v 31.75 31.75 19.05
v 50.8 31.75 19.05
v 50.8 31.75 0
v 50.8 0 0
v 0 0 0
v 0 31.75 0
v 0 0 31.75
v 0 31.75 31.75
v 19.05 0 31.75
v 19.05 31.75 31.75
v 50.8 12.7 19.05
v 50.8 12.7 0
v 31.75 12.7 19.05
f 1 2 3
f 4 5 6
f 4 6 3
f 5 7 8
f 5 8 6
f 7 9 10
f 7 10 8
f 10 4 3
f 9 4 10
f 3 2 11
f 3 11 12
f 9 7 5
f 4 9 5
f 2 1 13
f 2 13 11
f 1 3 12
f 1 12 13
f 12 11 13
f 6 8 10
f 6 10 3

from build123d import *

# Parameters (mm, degrees)
F1_DEPTH = 31.75
F3_DEPTH = 19.05


with BuildPart() as f1:
    # F0 (on Front) → F1 (new body)
    with BuildSketch(Plane.XZ):
        Polygon((0, 31.75), (0, 0), (50.8, 0), (19.05, 31.75), align=None)
    extrude(amount=-F1_DEPTH)


with BuildPart() as f3:
    # F2 (on face) → F3 (new body)
    with BuildSketch(Plane(origin=(0, 31.75, 0), x_dir=(-1, 0, 0), z_dir=(0, 1, 0))):
        Polygon((-50.8, 19.05), (-50.8, 0), (-31.75, 19.05), align=None)
    extrude(amount=-F3_DEPTH)


solid = Compound([f1.part, f3.part])
